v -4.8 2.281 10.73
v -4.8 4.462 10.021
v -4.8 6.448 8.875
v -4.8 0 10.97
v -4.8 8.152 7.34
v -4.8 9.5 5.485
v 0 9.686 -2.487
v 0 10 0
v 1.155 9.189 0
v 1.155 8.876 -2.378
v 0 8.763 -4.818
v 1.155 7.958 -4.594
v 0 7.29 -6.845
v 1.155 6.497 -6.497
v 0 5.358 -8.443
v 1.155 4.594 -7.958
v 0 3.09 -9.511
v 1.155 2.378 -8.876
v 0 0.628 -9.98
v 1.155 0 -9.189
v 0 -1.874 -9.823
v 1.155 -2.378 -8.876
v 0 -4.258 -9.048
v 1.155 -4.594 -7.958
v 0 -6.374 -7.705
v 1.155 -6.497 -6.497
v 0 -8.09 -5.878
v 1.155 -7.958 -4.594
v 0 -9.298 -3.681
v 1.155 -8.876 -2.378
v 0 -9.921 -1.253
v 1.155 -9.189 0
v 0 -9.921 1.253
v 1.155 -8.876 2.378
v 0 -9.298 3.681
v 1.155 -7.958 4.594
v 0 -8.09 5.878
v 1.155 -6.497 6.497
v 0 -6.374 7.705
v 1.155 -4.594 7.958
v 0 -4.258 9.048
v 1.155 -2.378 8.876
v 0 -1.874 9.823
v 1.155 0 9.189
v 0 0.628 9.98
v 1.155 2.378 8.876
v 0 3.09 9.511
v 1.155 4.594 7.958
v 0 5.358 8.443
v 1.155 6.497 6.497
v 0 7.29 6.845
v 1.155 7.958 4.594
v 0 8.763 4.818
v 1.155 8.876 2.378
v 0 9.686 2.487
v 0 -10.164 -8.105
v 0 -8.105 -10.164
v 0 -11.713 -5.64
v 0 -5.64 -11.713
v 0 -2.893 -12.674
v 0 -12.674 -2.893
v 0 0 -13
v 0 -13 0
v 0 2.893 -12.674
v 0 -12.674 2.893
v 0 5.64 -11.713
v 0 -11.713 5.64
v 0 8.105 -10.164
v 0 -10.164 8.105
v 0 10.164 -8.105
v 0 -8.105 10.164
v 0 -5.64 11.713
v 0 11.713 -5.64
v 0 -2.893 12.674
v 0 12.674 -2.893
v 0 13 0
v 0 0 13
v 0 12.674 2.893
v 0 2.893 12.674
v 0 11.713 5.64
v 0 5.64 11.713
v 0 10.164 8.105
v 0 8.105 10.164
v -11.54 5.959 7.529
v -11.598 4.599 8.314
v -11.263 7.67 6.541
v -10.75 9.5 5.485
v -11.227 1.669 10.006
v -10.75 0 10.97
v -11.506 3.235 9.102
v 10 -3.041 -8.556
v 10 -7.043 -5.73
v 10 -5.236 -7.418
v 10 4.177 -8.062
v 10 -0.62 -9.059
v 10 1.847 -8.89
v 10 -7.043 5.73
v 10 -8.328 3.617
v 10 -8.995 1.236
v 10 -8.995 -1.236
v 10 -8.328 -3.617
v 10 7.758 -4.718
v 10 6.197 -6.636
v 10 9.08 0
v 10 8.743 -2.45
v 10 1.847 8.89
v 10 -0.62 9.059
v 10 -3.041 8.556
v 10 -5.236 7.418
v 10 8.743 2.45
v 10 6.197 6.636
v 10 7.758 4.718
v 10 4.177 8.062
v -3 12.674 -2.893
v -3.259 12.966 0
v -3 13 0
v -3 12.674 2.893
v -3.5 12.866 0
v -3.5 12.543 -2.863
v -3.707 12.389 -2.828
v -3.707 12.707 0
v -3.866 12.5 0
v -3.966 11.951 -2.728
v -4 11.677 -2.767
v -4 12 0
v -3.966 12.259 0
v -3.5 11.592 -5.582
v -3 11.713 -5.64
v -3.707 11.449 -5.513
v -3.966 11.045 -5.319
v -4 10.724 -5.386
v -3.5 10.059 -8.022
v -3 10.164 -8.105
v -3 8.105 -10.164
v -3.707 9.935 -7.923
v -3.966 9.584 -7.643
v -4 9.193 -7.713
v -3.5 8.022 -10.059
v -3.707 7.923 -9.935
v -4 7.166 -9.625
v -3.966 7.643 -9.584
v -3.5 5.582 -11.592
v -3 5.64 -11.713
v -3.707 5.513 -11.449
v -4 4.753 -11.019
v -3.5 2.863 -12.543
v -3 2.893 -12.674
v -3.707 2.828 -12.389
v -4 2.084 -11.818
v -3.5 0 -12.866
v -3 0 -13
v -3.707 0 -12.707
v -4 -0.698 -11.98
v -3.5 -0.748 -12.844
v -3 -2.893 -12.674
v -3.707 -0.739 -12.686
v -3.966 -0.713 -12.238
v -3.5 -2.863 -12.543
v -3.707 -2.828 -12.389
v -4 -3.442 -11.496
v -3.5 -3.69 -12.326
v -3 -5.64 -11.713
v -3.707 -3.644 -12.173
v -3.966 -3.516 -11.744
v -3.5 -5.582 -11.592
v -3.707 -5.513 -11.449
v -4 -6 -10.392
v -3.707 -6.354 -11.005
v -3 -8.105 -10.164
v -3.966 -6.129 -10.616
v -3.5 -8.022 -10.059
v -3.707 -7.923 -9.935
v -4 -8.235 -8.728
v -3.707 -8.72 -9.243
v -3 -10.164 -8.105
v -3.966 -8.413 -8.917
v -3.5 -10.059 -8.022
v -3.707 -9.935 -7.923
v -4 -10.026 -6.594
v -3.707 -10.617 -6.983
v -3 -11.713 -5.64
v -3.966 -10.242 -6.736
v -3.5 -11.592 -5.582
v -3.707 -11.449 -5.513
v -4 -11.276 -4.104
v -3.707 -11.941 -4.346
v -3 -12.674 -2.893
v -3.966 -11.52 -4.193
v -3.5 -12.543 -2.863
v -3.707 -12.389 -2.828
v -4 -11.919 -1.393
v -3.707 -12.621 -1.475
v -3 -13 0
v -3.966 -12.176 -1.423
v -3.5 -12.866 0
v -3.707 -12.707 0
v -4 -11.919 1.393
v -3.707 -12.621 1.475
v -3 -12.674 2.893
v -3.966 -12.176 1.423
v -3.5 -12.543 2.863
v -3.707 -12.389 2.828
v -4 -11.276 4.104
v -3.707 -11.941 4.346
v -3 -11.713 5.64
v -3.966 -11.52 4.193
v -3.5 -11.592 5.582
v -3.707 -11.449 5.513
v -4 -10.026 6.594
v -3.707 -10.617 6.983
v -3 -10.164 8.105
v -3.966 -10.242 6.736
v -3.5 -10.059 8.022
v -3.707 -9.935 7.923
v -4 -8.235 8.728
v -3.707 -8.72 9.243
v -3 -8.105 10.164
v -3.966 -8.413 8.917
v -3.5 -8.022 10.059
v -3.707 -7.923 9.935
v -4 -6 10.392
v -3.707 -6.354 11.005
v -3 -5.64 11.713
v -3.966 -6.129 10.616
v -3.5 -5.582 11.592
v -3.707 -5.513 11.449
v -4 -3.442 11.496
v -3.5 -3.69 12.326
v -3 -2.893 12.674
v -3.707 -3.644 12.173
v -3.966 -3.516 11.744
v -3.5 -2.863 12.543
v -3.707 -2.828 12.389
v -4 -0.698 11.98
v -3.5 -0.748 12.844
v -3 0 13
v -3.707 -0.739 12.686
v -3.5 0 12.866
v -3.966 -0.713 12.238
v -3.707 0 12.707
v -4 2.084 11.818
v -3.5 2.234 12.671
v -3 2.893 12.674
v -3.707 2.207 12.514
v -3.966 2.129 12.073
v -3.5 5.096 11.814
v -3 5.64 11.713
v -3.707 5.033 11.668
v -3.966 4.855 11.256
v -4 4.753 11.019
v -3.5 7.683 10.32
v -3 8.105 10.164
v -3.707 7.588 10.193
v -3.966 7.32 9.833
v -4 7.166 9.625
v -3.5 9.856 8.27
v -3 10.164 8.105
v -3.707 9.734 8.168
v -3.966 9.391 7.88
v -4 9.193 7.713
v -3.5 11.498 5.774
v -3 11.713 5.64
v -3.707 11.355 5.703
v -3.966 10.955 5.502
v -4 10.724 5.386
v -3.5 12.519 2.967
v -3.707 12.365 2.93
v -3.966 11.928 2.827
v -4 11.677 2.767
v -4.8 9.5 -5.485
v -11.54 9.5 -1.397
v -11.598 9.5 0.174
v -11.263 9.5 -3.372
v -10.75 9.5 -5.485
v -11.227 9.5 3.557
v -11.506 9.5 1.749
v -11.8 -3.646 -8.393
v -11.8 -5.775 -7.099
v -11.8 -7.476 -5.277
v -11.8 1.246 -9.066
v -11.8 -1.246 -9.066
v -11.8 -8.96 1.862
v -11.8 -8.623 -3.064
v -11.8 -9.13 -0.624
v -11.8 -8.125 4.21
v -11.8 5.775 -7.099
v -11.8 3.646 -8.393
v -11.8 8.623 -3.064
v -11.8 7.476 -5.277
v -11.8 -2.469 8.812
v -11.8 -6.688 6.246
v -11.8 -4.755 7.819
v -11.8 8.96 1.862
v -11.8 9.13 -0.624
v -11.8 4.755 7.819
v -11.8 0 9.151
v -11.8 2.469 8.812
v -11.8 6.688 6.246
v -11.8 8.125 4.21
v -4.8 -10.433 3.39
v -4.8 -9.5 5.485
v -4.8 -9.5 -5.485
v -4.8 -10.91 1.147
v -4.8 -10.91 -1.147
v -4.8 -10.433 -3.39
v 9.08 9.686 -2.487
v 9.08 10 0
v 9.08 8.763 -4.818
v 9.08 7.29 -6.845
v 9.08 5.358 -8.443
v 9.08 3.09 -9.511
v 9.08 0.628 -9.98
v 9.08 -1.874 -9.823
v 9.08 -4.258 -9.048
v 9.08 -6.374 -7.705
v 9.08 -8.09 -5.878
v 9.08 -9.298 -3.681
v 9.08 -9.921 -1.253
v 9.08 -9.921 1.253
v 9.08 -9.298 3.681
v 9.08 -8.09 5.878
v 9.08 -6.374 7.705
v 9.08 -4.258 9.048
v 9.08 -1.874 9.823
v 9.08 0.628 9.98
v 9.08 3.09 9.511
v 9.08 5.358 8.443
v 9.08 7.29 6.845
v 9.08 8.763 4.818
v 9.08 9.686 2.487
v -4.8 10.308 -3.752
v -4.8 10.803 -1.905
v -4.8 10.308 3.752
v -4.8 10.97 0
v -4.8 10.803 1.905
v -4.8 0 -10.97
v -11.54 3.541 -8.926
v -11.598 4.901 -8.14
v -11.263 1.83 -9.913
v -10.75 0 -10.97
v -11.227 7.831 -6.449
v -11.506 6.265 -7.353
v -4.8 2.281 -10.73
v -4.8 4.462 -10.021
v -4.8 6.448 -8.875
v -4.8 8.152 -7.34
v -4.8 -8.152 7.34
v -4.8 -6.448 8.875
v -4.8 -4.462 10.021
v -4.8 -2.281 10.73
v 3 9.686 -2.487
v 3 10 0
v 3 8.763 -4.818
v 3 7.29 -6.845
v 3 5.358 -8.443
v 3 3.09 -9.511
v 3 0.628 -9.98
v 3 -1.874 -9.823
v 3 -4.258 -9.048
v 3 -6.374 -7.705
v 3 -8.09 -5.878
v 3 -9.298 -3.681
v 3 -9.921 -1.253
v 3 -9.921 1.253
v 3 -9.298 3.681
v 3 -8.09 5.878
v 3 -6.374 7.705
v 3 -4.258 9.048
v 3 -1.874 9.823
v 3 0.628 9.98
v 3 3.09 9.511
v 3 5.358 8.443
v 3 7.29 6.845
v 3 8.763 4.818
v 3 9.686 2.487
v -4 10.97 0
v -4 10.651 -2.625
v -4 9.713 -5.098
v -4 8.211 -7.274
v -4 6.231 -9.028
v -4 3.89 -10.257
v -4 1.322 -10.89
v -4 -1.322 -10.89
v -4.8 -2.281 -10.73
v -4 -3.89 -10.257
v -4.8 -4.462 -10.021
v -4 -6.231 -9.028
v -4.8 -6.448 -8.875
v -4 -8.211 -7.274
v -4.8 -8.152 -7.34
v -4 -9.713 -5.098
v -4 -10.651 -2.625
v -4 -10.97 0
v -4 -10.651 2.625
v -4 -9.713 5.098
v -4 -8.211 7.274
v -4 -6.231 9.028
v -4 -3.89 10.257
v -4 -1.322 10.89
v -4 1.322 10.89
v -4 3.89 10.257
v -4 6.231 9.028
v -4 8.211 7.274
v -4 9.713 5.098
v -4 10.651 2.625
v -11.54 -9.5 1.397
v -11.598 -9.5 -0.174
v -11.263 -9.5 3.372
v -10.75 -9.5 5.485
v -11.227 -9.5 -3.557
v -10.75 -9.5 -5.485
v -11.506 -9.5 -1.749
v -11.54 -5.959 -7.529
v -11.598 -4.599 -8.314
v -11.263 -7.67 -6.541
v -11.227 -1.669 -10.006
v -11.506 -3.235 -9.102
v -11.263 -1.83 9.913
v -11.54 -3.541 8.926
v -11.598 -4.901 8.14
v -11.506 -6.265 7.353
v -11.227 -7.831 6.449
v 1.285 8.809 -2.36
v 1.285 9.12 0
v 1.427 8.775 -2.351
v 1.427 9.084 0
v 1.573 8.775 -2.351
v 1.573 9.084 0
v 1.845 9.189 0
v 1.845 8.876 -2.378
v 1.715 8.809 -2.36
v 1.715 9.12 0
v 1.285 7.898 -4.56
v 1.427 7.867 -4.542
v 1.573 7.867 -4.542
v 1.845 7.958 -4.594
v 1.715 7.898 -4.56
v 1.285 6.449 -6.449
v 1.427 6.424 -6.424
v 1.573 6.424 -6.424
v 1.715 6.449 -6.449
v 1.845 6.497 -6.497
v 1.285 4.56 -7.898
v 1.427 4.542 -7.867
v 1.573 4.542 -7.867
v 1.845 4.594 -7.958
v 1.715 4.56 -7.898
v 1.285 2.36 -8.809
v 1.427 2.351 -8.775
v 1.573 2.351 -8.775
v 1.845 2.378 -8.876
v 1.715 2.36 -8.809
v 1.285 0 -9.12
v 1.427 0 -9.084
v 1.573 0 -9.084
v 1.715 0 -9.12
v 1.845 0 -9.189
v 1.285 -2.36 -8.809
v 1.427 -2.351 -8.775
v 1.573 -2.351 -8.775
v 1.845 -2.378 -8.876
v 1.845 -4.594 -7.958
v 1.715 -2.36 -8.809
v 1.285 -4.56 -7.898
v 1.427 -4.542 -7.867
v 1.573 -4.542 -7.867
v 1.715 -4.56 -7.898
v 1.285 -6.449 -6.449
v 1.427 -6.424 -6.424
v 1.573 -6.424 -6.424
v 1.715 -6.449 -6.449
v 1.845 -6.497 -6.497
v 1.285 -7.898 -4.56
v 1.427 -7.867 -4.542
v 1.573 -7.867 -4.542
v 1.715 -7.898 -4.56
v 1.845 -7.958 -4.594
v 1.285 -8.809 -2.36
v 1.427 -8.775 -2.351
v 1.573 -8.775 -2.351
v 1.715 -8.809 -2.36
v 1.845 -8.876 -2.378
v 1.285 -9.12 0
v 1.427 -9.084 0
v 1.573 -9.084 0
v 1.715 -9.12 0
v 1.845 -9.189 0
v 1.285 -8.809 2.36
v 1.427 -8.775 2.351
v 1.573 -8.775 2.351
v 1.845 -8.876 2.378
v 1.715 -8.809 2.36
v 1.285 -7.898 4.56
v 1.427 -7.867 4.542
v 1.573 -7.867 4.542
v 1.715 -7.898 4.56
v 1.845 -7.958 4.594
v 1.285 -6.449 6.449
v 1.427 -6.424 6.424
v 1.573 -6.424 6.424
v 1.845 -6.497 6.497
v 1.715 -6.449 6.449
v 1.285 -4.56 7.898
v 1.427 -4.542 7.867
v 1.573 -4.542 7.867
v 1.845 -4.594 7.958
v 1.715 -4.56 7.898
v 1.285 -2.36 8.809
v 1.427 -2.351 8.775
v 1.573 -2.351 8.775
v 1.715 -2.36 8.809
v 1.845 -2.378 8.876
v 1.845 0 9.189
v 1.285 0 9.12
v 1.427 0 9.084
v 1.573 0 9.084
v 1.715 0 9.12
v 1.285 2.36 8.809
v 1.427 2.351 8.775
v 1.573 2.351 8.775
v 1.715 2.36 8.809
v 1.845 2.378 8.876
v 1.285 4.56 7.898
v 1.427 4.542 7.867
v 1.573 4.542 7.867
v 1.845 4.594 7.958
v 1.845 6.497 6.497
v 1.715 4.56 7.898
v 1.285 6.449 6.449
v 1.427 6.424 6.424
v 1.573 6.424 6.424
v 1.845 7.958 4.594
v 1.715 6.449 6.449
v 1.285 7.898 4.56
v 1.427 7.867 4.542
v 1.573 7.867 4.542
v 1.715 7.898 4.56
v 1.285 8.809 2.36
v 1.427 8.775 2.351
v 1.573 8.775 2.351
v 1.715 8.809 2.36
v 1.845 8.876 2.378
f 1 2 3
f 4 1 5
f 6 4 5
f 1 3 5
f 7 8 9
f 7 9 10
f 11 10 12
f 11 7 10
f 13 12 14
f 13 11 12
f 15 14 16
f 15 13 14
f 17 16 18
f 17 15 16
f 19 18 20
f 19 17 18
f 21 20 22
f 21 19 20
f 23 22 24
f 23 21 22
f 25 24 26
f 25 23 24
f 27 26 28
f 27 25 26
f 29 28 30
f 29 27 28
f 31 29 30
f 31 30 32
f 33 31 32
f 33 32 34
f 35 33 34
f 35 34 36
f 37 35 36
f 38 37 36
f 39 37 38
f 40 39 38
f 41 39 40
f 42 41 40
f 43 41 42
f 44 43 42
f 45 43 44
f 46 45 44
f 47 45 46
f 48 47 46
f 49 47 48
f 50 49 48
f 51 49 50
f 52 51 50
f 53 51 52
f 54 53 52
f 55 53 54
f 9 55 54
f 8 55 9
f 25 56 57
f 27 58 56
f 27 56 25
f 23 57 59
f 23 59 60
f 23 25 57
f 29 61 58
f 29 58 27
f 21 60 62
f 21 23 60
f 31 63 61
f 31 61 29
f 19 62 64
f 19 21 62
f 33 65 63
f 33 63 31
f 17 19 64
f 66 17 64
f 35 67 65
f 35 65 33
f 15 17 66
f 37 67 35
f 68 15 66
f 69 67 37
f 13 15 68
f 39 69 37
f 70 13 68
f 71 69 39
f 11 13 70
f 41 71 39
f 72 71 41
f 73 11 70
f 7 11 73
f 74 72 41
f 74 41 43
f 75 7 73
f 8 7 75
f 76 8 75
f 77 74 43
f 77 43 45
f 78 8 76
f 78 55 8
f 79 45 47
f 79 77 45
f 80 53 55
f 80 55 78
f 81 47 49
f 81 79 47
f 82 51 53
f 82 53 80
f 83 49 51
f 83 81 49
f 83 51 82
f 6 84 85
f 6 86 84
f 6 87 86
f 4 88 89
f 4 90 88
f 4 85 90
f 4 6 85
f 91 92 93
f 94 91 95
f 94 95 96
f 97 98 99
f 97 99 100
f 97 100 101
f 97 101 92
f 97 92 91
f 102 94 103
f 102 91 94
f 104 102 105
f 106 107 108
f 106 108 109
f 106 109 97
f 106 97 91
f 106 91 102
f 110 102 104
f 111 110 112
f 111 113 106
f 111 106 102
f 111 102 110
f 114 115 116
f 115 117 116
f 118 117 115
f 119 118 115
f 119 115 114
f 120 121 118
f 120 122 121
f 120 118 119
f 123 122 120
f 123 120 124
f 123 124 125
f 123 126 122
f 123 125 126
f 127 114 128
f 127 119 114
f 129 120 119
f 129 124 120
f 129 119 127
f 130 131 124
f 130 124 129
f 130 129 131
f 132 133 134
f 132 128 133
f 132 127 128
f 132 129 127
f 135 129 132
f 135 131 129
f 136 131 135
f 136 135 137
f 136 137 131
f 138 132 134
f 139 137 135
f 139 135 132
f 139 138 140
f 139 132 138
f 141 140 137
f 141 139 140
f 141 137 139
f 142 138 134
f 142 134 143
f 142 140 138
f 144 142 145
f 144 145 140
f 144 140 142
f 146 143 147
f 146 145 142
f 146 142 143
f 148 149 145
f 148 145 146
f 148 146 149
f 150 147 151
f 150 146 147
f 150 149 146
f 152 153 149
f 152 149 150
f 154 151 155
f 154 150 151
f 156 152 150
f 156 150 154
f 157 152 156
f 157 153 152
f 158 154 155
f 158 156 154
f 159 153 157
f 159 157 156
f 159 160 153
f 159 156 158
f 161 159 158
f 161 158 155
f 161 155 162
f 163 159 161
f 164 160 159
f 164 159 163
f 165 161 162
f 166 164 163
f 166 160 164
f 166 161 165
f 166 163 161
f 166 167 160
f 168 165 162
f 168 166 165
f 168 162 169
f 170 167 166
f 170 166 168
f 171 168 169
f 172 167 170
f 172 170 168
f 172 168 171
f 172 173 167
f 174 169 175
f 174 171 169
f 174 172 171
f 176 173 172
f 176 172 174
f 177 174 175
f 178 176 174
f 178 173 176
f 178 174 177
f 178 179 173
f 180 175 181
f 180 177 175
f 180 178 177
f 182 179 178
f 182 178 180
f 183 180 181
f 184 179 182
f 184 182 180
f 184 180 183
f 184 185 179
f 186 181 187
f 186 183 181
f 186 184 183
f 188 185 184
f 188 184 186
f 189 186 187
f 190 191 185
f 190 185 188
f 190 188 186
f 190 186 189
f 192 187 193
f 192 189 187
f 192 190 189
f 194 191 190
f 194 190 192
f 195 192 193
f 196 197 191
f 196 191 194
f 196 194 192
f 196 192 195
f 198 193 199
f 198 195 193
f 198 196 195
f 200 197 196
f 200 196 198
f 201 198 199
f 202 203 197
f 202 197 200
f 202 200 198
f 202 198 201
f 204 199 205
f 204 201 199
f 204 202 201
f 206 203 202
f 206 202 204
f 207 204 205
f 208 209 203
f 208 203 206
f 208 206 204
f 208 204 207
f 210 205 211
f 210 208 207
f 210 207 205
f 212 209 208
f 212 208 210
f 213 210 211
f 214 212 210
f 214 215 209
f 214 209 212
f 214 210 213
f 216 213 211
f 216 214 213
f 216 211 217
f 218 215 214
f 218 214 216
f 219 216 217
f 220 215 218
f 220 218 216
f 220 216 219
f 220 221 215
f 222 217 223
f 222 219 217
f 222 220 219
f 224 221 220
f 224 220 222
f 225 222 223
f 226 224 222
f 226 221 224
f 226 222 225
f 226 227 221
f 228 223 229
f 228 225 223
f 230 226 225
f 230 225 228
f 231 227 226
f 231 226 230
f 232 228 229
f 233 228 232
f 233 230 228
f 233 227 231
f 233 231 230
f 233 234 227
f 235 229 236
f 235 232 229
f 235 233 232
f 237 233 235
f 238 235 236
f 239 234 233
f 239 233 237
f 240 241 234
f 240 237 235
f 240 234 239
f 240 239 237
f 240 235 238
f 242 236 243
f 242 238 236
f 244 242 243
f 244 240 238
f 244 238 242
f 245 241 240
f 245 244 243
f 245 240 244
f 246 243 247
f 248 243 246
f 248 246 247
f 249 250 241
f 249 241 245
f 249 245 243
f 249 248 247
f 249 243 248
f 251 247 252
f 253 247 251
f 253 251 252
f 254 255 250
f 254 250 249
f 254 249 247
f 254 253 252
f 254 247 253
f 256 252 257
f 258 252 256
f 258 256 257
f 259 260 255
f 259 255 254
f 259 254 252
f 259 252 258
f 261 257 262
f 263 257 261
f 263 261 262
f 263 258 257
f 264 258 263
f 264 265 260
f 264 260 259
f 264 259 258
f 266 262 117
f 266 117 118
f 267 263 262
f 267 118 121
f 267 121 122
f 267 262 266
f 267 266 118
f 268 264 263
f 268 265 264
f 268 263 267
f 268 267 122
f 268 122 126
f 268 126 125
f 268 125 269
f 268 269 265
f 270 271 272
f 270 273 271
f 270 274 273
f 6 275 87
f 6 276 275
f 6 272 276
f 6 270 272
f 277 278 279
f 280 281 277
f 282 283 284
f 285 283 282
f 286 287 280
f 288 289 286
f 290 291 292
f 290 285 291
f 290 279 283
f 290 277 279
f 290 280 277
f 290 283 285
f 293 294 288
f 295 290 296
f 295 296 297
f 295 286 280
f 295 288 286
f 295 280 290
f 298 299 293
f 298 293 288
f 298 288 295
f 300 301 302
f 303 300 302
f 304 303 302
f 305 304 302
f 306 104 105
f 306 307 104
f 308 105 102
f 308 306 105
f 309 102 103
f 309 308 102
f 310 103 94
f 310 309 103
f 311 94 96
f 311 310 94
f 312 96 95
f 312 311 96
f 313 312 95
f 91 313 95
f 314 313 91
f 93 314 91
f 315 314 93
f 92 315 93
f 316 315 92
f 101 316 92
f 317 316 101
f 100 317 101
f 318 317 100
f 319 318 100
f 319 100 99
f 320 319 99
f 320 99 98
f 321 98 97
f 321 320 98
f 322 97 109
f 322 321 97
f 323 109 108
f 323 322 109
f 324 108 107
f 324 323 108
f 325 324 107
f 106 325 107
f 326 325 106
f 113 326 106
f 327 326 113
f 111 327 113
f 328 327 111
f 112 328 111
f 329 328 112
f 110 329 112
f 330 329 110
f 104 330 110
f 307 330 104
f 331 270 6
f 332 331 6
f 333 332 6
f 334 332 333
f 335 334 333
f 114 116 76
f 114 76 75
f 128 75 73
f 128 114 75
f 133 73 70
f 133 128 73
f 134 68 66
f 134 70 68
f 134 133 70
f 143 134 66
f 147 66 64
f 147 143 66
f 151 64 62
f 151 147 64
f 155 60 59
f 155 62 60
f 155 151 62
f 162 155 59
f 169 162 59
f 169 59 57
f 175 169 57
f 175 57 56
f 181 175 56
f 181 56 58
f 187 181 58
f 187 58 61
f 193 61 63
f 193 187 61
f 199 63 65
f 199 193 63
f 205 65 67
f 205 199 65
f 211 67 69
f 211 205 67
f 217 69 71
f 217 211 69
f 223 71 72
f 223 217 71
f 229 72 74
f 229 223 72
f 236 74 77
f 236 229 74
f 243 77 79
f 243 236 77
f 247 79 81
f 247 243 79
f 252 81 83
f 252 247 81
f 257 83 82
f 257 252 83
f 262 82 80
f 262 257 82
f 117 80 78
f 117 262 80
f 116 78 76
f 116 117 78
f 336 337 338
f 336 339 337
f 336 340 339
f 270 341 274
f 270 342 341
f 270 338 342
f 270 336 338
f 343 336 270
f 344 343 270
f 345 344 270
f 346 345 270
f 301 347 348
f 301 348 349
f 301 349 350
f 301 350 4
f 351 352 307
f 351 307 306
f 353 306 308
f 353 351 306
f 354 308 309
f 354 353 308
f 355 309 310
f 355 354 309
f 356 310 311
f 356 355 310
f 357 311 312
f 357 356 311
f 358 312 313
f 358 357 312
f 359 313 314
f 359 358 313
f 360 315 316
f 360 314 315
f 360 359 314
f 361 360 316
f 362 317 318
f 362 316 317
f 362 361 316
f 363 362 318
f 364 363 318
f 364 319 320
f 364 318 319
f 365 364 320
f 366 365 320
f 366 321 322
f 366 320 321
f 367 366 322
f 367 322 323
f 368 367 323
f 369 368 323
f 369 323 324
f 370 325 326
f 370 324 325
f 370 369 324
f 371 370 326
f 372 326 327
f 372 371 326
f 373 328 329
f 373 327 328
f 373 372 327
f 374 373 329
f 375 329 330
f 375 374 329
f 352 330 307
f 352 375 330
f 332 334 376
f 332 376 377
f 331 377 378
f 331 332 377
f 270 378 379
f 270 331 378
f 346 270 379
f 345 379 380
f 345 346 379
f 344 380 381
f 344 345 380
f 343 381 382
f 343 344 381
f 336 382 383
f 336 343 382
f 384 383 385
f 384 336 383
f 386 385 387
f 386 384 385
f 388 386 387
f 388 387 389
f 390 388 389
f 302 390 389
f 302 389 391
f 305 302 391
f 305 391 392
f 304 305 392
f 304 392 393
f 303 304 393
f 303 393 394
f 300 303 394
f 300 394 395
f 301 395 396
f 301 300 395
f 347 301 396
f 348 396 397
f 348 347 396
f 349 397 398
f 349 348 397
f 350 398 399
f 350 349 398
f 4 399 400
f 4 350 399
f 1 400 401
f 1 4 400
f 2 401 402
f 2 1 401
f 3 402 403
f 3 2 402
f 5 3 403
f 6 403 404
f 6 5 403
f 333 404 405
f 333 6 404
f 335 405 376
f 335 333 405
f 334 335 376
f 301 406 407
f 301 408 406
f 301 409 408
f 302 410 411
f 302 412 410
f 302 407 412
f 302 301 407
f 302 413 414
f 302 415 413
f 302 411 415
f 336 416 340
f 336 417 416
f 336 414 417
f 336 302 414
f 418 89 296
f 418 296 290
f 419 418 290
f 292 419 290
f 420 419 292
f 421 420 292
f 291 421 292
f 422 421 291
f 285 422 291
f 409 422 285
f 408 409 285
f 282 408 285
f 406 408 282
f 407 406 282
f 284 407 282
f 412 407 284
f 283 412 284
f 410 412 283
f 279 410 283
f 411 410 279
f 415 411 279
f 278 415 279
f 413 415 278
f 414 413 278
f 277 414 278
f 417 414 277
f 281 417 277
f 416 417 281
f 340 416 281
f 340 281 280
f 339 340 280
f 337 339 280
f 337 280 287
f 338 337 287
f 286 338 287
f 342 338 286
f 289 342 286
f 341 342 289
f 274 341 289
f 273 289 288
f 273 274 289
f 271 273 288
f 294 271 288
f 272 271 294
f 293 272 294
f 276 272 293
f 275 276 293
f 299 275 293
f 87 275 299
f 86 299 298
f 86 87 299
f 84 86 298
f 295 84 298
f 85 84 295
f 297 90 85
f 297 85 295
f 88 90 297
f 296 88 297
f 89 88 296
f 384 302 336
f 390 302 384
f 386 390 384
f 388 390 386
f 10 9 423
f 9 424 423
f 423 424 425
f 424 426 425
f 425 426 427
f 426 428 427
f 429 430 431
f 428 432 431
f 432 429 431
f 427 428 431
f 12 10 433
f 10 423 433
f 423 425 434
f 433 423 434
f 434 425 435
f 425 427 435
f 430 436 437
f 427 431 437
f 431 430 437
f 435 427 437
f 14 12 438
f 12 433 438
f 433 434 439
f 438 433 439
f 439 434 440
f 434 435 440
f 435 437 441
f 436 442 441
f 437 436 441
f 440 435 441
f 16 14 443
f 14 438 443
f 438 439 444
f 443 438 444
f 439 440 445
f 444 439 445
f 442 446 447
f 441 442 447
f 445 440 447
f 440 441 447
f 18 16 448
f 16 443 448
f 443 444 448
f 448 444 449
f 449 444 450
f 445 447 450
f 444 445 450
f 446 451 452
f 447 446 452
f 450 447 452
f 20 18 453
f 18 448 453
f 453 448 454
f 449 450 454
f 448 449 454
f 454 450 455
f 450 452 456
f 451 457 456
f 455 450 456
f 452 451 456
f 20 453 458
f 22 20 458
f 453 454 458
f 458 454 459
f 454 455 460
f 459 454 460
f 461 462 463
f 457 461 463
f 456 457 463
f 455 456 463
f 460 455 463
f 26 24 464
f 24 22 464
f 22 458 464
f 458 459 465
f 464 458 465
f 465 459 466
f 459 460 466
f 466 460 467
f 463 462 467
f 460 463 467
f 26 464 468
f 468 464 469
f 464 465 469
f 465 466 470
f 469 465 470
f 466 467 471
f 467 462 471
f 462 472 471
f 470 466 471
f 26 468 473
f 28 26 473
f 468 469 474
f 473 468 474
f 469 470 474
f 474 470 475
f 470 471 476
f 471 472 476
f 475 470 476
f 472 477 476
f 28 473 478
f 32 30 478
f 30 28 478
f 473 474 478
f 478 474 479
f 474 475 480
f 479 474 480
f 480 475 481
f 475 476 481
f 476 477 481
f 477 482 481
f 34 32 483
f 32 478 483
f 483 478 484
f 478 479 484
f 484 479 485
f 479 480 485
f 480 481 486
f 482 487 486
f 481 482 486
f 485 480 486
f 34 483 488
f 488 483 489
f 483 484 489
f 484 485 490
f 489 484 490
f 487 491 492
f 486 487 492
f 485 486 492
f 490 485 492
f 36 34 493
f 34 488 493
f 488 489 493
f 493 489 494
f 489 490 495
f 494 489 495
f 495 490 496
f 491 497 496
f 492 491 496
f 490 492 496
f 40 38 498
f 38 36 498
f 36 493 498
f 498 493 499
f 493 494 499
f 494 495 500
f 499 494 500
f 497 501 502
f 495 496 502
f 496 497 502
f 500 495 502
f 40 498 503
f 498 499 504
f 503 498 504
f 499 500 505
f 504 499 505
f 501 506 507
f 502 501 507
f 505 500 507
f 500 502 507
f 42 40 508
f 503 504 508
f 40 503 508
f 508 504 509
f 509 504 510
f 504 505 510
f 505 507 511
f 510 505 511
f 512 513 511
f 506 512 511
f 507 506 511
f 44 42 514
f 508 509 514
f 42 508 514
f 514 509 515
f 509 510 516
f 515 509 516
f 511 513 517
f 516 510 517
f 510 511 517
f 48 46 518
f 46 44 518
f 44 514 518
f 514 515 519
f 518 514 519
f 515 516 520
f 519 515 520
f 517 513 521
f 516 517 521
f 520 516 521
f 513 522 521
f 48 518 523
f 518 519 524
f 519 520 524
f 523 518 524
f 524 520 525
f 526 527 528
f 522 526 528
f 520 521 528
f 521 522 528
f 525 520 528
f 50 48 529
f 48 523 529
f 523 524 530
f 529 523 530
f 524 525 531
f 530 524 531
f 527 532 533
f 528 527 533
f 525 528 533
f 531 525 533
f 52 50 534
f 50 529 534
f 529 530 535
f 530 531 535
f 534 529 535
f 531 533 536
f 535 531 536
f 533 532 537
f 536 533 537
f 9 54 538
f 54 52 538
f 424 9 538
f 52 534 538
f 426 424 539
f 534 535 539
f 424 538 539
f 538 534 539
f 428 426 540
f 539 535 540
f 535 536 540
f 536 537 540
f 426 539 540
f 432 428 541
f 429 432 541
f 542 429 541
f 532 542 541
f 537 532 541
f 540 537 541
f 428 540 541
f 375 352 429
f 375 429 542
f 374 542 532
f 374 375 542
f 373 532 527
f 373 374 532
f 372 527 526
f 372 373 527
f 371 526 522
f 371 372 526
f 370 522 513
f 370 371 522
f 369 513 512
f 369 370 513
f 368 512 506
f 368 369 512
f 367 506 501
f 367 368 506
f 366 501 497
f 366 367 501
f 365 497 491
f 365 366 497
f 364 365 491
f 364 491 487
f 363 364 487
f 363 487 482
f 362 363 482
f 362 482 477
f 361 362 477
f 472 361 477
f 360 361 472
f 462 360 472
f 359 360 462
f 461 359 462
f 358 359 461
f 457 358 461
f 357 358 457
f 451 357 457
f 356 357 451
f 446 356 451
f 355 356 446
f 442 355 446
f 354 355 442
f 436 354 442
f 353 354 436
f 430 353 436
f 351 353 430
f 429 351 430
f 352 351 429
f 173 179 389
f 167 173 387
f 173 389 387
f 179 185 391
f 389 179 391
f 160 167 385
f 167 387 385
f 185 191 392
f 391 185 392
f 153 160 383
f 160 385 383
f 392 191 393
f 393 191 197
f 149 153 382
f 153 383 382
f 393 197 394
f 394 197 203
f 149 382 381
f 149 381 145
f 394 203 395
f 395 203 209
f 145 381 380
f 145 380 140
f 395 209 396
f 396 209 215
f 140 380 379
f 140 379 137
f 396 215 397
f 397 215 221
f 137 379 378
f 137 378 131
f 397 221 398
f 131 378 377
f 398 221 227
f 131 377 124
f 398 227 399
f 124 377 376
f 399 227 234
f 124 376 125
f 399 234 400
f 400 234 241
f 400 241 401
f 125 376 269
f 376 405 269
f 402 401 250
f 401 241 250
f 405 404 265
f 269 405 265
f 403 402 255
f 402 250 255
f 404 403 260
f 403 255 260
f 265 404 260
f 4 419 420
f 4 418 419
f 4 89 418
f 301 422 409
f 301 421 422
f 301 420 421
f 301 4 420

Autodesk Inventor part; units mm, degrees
ref_plane "YZ Plane" through (0, 0, 0) normal (1, 0, 0) x (0, 1, 0)
ref_plane "XZ Plane" through (0, 0, 0) normal (0, 1, 0) x (-1, 0, 0)
ref_plane "XY Plane" through (0, 0, 0) normal (0, 0, 1) x (1, 0, 0)
sketch "Эскиз1" plane through (0, 0, 0) normal (0, 0, 1) x (1, 0, 0)
  line L0 (10, 0) -> (10, 10)
  line L1 (10, 10) -> (3, 10)
  line L2 (3, 10) -> (1.8448, 9.1888)
  line L3 (1.1552, 9.1888) -> (0, 10)
  line L4 (0, 10) -> (0, 13)
  line L5 (0, 13) -> (-4, 13)
  line L6 (-4, 13) -> (-4, 10.9697)
  line L7 (-4, 10.9697) -> (-4.8, 10.9697)
  line L8 (-4.8, 10.9697) -> (-4.8, 0)
  line L9 (-4.8, 0) -> (10, 0)
  arc A0 (1.1552, 9.1888) -> (1.8448, 9.1888) centre (1.5, 9.6798) ccw
  line L10 (-7.8876, 0) -> (13.7255, 0) projected
  line L11 (0, -2.6) -> (0, 15.6) projected
  line L12 (2.3733, 9.0798) -> (10.6379, 9.0798) construction
  dimension "d0" = 0.6
  dimension "d1" = 20
  dimension "d2" = 26
  dimension "d3" = 10
  dimension "d4" = 3
  dimension "d5" = 1.5
  dimension "d6" = 21.9393
  dimension "d7" = 4
  dimension "d8" = 0.8
  dimension "d10" = 18.1596
revolve "Базовый элемент" add sketch "Эскиз1" angle 360 about axis through (-4.8, 0, 0) along (1, 0, 0)
sketch "Эскиз2" plane through (-4.8, 0, 0) normal (-1, 0, 0) x (0, 0, 1)
  circle A0 centre (0, 0) radius 10.9697 projected
  line L0 (10.9697, 0) -> (5.4848, -9.5)
  line L1 (5.4848, -9.5) -> (-5.4848, -9.5)
  line L2 (-5.4848, -9.5) -> (-10.9697, 0)
  line L3 (-10.9697, 0) -> (-5.4848, 9.5)
  line L4 (-5.4848, 9.5) -> (5.4848, 9.5)
  line L5 (5.4848, 9.5) -> (10.9697, 0)
extrude "С головкой" add sketch "Эскиз2" along normal blind 7 contours L0 L1 L2 L3 L4 L5
fillet "Сопряжение1" radius 1 1 edges at (-4, -13, 0)
sketch "Эскиз3" plane through (0, 0, 0) normal (0, 1, 0) x (-1, 0, 0)
  line L0 (10.75, 10.9697) -> (11.8, 9.151)
  line L1 (11.8, 9.151) -> (11.8, 10.9697)
  line L2 (11.8, 10.9697) -> (10.75, 10.9697)
  line L3 (12.01, 0) -> (10.54, 0) projected
  dimension "d14" = 1.05
  dimension "d15" = 30
revolve "Фаска1" cut sketch "Эскиз3" angle 360 about axis through (-10, 0, 0) along (1, 0, 0)
thread "Резьба1" size "M20x1.5" class "6g" standard "ISO Metric profile" length 10
chamfer "Фаска2" distance 0.9202 distance2 0.9202 1 edges at (10, -10, 0) measured on face at (7.6667, 9.9676, -0.8047)
equation "\"d12\" = KOH"
equation "\"d14\" = 0.15 * KOH"
equation "\"d17\" = RR"
equation "\"d20\" = NLG"
equation "\"d18\" = GAL"
equation "\"d19\" = -0.5 * GD1 + 0.5 * NND"
equation "\"d0\" = 0.2 * GAL1"
equation "\"d1\" = NND"
equation "\"d2\" = KOD"
equation "\"d3\" = NLG"
equation "\"d4\" = GAL1"
equation "\"d5\" = 0.5 * GAL1"
equation "\"d6\" = n_D"
equation "\"d7\" = SD"
equation "\"d8\" = PHH"
equation "\"d10\" = GD1"
equation "\"NLG\" = 10"
equation "\"NND\" = 20"
equation "\"SD\" = 4"
equation "\"PHH\" = 0.8"
equation "\"SW\" = 19"
equation "\"GAL1\" = 3"
equation "\"KOH\" = 7"
equation "\"KOD\" = 26"
equation "\"GAL\" = 0.61345 * PTC"
equation "\"RR\" = 1"
equation "\"GD1\" = THREADDIA - 1.2269 * PTC"
equation "\"n_D\" = 1.1547 * SW"
equation "\"GUL\" = 0.61345 * PTC"
equation "\"TOA\" = 30deg"
equation "\"PTC\" = 1.5"
equation "\"THREADDIA\" = 20"
properties part number "CSN 02 1915.21 - M 20 x 10" material "Сталь, мягкая"
